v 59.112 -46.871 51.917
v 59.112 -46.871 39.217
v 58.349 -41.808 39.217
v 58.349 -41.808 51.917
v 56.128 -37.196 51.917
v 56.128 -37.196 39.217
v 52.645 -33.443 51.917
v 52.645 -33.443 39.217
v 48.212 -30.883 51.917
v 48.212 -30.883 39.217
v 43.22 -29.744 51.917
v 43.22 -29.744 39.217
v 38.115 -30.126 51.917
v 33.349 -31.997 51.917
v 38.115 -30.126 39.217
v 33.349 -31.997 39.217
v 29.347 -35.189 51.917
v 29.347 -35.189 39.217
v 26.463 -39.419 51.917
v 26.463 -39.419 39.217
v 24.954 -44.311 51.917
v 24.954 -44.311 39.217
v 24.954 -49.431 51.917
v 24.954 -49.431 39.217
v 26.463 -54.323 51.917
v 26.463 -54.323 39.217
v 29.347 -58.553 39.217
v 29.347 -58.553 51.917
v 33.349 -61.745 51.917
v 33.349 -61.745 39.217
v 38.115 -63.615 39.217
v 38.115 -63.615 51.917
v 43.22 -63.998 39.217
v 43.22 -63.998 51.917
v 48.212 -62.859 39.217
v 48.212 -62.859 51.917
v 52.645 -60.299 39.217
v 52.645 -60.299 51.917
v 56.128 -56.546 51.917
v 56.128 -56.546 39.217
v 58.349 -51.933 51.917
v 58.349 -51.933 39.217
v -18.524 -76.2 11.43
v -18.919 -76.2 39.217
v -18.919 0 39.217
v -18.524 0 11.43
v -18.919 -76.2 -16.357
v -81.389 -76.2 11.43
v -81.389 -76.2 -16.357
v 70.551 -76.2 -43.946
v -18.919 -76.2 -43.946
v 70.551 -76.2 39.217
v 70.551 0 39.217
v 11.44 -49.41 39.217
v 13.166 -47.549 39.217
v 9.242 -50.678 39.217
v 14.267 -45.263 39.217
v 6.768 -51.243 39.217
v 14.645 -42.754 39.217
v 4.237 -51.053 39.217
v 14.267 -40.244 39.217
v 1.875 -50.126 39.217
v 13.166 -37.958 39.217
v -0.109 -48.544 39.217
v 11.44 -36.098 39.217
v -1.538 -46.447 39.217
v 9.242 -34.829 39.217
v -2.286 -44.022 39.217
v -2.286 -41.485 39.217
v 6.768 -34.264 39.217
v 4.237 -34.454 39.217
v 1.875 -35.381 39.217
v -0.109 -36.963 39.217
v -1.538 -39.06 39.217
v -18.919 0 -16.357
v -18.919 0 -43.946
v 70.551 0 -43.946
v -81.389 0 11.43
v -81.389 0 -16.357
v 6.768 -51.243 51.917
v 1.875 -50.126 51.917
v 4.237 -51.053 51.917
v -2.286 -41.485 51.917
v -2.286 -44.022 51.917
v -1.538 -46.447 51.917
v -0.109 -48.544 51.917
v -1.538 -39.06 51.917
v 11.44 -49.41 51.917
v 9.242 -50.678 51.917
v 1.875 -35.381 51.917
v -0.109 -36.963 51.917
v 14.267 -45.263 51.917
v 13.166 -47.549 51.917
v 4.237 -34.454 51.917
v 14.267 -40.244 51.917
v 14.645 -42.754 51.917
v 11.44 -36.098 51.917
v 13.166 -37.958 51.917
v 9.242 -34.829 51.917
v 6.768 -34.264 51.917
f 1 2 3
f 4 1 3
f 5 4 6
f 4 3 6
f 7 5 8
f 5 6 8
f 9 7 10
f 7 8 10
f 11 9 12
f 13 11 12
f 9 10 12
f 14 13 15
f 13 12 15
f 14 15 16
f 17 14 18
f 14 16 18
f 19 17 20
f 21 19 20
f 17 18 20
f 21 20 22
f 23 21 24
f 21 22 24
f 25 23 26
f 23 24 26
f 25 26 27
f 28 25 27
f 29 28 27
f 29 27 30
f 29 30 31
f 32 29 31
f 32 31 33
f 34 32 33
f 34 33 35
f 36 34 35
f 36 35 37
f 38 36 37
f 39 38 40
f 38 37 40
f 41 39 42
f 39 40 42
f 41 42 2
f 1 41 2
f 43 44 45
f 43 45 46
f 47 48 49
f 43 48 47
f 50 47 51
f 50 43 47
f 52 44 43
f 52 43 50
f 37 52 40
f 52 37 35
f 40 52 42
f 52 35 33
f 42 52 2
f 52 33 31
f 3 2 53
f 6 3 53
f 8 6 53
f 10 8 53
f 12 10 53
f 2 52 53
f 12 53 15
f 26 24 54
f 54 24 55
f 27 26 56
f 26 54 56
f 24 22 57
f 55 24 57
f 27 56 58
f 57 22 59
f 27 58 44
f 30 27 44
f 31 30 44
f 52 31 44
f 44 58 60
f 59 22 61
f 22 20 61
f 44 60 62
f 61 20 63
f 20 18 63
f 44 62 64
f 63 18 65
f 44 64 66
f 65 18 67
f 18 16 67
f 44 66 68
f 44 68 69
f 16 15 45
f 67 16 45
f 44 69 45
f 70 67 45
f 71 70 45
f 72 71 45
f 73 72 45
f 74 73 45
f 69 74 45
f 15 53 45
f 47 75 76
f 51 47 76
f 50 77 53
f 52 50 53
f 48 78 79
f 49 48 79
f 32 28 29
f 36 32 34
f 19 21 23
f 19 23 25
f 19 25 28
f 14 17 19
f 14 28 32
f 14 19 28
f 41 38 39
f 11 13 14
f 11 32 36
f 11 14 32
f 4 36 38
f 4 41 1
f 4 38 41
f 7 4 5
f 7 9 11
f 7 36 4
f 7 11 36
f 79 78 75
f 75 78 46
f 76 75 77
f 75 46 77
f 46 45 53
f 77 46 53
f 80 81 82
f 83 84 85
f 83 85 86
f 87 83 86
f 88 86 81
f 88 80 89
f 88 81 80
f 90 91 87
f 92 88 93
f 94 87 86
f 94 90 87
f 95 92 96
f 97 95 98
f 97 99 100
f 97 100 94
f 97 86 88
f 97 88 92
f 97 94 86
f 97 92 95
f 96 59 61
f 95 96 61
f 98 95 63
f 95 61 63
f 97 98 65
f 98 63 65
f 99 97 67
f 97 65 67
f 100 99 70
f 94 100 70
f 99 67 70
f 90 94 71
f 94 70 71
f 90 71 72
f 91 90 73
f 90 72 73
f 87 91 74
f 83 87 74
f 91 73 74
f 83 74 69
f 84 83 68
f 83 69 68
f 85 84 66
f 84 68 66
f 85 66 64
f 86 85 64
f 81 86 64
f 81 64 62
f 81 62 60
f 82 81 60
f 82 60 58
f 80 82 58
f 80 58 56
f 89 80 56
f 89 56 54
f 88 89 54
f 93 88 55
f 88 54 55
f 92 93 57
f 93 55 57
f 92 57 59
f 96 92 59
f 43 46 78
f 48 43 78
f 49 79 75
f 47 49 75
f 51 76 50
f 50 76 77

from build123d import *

# Parameters (mm, degrees)
F1_DEPTH = 76.2
F2_R     = 17.175064
F2_R_2   = 8.513292
F3_DEPTH = 12.7


with BuildPart() as f1:
    # F0 (on Front) → F1 (new body)
    with BuildSketch(Plane.XZ):
        Polygon((-18.524483, 11.430001), (-81.389479, 11.430001), (-81.389479, -16.356725), (-18.918622, -16.356725), (-18.918622, -43.946382), (70.550688, -43.946382), (70.550688, 39.216723), (-18.918622, 39.216723), align=None)
    extrude(amount=F1_DEPTH)

    # F2 (on face) → F3 (join)
    with BuildSketch(Plane.XY.offset(39.216723)):
        with Locations((41.936964, -46.870772)):
            Circle(F2_R)
        with Locations((6.131807, -42.753547)):
            Circle(F2_R_2)
    extrude(amount=F3_DEPTH)


solid = f1.part
